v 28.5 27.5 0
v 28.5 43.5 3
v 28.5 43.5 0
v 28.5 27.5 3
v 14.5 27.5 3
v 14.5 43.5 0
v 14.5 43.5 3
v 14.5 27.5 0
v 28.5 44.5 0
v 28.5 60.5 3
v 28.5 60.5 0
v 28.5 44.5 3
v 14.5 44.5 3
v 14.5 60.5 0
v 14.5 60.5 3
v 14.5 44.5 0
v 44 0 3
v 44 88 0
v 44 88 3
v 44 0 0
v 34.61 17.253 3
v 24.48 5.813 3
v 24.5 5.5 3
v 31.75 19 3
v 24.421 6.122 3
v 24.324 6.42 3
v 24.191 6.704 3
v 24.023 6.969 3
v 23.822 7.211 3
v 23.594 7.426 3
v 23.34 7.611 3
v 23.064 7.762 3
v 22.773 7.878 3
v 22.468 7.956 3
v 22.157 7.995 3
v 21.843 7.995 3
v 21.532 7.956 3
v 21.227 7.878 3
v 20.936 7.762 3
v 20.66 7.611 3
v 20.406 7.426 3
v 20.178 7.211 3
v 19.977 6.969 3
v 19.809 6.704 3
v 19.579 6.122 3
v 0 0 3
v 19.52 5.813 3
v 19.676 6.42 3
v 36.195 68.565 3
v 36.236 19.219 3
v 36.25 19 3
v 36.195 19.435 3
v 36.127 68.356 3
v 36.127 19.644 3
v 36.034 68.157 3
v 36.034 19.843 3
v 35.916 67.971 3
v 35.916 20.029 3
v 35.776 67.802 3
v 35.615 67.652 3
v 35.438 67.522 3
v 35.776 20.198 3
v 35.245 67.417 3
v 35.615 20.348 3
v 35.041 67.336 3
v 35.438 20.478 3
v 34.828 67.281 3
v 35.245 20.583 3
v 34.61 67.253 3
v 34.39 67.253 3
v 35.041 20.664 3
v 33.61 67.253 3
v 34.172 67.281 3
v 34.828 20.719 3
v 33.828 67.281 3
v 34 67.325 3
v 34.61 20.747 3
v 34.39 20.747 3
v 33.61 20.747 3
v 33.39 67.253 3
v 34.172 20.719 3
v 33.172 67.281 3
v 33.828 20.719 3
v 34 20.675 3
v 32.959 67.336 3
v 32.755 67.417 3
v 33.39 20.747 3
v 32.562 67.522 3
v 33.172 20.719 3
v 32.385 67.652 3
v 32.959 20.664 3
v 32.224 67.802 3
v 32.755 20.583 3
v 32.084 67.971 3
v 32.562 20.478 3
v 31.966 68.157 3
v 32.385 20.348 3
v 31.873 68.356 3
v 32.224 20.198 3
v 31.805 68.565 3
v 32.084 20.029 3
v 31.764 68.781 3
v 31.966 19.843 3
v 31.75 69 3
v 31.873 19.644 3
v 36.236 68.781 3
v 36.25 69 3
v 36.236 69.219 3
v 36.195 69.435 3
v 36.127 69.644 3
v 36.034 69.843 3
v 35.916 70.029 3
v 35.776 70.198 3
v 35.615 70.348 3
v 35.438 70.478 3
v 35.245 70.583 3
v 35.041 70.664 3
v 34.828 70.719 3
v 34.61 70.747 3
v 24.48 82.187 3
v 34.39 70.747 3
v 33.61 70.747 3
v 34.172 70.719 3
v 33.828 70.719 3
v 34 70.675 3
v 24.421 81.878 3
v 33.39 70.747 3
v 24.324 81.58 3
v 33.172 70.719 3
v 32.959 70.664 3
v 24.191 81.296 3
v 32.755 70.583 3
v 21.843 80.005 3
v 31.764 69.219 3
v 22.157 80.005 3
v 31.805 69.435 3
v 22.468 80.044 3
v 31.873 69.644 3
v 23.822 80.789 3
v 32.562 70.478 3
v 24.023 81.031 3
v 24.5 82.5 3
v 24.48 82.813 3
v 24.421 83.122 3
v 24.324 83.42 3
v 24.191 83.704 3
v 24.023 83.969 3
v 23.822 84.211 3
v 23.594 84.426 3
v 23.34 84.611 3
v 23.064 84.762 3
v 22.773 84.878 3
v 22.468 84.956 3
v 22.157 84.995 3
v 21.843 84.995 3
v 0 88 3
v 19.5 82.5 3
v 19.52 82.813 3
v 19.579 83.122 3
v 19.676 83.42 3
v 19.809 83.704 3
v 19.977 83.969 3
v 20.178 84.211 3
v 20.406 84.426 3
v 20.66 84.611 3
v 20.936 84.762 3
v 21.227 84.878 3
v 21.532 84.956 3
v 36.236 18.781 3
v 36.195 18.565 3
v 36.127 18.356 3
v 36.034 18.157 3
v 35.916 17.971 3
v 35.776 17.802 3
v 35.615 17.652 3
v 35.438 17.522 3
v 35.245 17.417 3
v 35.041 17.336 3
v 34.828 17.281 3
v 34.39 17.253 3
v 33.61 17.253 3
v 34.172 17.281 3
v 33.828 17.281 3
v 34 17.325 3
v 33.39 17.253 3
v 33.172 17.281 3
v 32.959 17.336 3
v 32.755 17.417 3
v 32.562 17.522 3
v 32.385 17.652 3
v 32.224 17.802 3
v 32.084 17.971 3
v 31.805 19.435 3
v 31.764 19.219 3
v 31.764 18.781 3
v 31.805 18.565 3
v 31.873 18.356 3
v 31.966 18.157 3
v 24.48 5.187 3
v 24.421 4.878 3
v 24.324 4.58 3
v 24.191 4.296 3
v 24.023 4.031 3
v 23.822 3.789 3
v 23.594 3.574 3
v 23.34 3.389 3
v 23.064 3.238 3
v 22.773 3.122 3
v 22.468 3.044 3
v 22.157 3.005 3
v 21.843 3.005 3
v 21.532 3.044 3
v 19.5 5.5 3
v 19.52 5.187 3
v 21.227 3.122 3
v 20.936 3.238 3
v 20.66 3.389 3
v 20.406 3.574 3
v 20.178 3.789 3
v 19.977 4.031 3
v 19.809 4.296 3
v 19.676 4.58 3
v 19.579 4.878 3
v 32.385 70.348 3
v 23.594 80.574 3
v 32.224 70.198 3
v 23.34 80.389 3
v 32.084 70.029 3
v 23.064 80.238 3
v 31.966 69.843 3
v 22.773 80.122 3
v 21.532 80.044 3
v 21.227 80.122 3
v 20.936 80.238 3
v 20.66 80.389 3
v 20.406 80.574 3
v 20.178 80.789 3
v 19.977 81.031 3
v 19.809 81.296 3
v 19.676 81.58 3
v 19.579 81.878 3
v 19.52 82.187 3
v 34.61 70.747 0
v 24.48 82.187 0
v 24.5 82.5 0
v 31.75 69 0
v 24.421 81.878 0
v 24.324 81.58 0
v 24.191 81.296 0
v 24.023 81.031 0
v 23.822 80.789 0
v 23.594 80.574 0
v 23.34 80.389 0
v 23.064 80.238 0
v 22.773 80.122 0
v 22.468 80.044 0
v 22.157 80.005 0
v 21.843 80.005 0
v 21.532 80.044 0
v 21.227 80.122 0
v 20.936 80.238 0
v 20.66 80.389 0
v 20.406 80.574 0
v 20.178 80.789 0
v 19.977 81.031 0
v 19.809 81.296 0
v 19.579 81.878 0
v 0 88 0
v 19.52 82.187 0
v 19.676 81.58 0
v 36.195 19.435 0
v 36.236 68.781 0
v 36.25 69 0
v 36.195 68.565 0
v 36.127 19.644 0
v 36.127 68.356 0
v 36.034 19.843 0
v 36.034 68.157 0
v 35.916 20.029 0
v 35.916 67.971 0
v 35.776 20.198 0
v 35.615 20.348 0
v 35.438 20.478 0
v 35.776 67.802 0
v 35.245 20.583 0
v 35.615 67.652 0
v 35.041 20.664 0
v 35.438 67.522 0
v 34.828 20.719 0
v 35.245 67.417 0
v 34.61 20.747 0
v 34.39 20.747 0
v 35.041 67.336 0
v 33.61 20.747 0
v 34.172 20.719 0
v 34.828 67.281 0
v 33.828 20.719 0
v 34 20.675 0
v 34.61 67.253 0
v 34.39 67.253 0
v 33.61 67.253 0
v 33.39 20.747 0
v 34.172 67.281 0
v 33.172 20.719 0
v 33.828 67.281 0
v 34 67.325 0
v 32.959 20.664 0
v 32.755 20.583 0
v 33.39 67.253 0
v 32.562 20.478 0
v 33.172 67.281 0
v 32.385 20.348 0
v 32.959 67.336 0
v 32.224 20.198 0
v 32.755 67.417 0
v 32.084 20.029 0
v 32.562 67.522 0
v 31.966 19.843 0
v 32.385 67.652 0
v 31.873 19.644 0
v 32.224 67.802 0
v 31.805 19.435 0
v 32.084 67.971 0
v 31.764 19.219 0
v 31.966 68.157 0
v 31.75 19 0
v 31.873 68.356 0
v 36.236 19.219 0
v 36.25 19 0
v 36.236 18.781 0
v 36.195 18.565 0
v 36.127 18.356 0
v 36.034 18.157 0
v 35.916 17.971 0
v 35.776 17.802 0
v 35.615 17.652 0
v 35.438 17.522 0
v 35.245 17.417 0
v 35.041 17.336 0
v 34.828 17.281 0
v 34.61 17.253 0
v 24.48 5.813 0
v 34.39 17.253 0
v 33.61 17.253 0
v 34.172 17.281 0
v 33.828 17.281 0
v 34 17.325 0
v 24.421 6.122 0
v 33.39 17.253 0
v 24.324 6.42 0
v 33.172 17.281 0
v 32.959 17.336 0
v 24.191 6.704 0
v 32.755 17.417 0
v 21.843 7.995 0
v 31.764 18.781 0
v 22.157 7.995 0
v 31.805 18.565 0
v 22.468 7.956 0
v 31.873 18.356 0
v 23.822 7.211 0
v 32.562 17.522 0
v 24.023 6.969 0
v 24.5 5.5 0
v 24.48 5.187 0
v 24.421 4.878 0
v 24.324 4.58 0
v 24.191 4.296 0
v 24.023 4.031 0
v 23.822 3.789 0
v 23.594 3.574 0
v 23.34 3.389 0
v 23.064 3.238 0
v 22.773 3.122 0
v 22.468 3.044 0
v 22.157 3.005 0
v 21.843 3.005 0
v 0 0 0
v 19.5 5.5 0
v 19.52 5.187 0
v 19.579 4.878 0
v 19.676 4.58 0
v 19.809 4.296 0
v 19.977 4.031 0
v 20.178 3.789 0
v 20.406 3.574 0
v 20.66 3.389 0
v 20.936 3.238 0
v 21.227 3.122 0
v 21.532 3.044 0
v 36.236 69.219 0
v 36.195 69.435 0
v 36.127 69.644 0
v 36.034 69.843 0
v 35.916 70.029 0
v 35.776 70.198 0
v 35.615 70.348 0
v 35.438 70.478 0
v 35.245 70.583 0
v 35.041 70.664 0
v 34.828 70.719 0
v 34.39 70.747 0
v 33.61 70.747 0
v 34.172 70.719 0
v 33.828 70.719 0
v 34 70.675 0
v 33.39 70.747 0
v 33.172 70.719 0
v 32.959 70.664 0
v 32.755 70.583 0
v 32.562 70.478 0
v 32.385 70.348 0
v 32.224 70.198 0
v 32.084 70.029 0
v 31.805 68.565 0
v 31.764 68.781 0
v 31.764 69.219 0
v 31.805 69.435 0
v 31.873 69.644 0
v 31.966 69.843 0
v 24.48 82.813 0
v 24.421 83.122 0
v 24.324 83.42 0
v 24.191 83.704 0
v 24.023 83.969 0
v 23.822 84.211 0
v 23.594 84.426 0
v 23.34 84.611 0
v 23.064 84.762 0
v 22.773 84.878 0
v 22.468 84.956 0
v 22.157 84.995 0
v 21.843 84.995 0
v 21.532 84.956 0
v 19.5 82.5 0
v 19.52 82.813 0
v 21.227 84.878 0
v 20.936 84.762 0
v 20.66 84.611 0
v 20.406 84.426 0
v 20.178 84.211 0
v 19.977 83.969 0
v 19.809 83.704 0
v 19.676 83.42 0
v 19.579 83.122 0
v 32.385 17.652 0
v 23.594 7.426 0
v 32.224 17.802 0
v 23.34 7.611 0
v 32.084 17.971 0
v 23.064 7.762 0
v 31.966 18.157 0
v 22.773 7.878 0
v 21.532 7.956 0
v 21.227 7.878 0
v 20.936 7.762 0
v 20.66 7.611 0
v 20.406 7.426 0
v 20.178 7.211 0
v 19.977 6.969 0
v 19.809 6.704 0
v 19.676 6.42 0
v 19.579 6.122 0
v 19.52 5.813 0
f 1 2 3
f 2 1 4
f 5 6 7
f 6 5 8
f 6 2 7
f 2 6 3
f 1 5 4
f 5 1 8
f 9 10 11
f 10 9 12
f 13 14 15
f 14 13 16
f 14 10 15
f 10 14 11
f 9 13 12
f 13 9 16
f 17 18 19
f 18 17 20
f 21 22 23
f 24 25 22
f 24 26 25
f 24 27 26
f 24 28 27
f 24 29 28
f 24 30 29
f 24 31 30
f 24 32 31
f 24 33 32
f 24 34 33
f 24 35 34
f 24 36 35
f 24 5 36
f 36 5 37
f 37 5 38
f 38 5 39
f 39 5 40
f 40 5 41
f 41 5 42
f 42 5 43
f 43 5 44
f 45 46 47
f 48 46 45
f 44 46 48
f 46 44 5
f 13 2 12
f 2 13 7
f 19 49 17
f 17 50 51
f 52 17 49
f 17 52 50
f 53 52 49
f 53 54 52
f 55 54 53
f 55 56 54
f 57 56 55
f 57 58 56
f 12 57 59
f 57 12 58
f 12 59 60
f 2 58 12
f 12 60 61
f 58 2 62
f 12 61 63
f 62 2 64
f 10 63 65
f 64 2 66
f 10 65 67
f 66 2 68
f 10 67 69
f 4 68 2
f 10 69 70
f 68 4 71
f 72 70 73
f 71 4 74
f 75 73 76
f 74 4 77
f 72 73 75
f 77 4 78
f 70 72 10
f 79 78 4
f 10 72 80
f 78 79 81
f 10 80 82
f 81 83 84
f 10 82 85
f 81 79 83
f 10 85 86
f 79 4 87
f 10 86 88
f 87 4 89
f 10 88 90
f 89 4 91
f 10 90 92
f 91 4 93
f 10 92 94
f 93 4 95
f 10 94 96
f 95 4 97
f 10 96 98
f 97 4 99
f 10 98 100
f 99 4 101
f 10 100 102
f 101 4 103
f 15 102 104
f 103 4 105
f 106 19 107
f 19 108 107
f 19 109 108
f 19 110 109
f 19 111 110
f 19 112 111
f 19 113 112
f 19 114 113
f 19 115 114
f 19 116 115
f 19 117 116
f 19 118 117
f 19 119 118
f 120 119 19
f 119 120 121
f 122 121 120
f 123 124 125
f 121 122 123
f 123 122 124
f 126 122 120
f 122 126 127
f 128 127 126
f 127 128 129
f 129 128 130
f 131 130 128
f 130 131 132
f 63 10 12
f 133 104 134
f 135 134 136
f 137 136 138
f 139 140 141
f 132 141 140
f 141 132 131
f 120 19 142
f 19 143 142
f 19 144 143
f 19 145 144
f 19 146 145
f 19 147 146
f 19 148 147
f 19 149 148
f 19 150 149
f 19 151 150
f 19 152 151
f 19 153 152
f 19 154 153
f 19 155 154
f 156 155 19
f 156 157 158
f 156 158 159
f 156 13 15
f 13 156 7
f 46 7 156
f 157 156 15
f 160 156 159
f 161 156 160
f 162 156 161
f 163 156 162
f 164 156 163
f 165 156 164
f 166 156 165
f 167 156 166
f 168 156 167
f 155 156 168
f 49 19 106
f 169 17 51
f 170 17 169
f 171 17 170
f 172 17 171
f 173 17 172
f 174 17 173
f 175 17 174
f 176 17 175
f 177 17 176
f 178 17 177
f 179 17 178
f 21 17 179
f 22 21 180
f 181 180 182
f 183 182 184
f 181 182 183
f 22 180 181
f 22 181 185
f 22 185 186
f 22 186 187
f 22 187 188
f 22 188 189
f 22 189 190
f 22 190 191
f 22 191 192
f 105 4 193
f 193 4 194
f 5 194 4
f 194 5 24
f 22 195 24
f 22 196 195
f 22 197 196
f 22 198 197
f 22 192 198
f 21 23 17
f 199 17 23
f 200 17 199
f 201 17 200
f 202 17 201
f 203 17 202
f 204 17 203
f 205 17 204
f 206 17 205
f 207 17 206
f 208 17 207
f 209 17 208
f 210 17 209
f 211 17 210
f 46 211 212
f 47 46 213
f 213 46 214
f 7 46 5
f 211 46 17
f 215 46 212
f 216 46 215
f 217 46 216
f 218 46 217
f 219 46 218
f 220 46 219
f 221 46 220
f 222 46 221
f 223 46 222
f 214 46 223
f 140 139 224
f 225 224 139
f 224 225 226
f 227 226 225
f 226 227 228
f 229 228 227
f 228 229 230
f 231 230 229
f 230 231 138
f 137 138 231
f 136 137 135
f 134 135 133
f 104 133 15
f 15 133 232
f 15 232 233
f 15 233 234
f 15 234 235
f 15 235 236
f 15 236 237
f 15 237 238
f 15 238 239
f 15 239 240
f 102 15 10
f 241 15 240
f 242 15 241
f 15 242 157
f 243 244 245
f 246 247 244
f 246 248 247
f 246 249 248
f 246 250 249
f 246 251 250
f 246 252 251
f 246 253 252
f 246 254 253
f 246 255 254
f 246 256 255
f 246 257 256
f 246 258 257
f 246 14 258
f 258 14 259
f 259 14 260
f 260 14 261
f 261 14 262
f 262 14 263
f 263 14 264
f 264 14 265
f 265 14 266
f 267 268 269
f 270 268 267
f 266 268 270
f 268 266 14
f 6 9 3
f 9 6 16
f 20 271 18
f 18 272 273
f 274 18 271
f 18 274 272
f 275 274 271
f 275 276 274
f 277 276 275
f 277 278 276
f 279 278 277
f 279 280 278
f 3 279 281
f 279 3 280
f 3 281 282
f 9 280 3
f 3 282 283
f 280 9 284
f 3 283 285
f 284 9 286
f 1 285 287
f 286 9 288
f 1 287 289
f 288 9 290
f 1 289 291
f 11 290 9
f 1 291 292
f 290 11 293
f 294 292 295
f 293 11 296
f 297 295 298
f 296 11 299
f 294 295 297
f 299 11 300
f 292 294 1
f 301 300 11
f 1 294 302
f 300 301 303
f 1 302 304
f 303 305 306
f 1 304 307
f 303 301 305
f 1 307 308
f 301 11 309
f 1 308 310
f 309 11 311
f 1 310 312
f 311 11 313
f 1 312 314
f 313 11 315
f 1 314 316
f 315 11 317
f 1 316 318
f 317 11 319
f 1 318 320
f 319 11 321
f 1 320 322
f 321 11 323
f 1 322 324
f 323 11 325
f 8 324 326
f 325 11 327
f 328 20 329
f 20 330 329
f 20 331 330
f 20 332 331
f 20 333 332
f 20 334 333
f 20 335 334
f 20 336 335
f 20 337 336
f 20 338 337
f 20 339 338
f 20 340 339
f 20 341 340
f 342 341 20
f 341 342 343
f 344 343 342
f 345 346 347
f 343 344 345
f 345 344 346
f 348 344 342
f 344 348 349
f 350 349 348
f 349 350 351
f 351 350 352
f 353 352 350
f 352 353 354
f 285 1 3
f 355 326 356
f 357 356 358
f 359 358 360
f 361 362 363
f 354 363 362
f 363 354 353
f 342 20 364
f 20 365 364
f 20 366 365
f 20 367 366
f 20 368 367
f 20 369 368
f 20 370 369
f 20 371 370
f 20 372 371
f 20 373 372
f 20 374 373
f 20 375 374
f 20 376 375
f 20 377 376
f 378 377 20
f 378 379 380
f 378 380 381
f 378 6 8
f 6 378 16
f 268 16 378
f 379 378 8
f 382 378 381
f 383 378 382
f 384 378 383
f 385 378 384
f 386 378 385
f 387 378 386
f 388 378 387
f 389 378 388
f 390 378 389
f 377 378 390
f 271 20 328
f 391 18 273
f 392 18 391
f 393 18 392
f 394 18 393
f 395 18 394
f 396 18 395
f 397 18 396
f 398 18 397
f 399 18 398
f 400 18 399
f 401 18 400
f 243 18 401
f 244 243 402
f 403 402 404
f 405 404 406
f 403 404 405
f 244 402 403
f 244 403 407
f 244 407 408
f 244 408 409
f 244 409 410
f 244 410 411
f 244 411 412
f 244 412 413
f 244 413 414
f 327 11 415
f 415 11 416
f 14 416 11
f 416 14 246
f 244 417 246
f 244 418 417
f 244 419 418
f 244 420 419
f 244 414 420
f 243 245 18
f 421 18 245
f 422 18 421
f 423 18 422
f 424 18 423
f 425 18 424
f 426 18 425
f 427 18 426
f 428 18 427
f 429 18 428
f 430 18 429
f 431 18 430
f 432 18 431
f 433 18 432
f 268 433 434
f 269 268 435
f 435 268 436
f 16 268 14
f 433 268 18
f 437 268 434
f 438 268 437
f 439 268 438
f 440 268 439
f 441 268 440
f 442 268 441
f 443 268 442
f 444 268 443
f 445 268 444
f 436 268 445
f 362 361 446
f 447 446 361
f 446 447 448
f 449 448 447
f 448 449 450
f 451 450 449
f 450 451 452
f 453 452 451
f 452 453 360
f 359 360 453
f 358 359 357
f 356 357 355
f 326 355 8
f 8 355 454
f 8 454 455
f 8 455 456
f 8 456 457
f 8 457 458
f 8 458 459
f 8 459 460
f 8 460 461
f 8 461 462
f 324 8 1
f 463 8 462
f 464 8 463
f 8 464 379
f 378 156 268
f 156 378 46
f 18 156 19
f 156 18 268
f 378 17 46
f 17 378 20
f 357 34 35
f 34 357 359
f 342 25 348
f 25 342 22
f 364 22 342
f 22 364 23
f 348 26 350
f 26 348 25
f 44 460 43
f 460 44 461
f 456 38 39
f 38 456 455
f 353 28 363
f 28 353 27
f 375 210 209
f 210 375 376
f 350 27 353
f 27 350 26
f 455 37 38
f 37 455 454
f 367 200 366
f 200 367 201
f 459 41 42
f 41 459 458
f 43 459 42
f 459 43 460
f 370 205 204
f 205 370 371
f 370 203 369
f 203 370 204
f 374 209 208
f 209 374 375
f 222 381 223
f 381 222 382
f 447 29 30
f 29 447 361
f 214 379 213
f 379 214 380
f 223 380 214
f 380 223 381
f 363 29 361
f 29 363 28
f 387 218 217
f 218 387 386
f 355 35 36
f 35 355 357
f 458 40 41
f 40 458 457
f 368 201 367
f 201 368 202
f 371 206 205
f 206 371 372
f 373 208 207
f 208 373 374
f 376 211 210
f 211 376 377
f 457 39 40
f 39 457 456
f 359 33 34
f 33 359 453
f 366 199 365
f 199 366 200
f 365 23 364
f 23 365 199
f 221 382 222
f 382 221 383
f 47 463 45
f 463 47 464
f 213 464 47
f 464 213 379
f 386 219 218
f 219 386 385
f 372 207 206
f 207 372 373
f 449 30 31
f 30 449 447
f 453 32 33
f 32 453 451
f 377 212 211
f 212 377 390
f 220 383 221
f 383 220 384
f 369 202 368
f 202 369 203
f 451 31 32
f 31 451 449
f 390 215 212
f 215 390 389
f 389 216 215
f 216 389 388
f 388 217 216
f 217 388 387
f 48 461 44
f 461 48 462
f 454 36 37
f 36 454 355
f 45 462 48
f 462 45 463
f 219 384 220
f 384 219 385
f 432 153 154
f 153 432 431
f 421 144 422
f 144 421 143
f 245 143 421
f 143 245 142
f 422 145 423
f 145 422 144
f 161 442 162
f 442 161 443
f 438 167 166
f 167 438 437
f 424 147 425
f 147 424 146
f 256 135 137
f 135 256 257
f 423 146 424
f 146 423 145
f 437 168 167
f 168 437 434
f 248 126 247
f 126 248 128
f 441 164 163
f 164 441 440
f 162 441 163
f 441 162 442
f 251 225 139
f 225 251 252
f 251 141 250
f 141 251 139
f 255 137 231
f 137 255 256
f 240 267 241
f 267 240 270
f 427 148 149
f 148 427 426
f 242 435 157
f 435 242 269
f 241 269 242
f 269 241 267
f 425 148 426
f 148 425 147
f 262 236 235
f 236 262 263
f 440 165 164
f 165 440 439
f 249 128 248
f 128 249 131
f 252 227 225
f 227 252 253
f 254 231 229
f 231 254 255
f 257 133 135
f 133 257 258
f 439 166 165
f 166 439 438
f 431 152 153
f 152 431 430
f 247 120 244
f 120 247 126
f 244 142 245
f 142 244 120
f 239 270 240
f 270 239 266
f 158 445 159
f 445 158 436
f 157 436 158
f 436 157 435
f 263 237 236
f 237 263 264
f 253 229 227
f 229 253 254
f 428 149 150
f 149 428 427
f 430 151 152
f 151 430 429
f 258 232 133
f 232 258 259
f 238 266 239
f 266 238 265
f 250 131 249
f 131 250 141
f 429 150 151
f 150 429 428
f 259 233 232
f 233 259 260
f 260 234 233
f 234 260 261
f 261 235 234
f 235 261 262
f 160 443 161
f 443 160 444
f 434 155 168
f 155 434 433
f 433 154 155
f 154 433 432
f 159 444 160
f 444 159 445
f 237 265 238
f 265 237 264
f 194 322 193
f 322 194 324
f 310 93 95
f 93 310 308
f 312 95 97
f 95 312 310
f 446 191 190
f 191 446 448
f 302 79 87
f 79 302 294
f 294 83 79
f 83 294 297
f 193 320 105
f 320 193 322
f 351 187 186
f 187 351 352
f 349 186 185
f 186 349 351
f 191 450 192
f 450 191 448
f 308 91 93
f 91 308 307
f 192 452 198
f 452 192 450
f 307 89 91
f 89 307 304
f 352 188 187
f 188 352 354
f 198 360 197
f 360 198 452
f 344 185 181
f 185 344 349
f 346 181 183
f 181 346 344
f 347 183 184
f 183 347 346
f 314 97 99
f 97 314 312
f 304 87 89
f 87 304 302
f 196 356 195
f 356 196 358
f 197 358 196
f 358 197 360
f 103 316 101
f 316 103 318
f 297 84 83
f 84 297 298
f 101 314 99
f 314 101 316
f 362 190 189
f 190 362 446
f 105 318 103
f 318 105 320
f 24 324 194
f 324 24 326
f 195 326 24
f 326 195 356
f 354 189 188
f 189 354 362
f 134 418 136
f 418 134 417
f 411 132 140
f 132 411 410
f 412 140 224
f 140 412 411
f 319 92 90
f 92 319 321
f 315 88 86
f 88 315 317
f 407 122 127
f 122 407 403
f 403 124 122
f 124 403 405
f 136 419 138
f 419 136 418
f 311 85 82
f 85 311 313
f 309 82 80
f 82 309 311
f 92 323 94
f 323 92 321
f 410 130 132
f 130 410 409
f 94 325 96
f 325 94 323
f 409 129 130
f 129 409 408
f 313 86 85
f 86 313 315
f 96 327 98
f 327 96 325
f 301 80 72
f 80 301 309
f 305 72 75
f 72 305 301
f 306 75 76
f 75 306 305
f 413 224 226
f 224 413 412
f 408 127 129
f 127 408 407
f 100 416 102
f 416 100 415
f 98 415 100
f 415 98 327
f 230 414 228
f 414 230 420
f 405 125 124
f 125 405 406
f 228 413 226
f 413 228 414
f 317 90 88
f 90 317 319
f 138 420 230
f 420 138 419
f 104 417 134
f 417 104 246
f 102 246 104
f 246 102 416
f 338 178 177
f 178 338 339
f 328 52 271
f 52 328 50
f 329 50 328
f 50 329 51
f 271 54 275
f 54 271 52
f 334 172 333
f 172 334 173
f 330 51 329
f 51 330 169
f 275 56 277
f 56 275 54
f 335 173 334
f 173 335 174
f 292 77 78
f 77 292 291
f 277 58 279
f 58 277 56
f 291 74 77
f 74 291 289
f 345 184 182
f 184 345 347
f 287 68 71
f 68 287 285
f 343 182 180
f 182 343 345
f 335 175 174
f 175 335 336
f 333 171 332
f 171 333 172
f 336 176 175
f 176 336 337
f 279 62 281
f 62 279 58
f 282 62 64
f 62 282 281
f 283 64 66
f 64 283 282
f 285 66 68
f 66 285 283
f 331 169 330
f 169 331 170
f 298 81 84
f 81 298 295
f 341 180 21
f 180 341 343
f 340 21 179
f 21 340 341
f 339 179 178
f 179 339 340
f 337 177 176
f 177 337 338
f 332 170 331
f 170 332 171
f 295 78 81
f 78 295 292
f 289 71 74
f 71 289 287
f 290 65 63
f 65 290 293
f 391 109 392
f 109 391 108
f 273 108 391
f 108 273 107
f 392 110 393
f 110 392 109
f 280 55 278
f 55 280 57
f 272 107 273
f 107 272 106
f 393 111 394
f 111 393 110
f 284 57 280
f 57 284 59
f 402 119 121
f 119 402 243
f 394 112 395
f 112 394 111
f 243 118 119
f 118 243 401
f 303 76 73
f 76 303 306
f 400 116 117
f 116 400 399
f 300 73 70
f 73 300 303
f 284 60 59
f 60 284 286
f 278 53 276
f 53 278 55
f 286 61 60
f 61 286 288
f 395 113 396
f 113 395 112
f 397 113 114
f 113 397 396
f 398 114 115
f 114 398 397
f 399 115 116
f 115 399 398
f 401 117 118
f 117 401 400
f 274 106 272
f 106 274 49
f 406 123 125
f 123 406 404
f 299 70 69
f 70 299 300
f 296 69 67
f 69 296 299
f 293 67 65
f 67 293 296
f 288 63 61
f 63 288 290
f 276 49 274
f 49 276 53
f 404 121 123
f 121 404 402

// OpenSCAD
$fn=50;

ep = 3;

bw = 45;

ethh = 14;
ethw = 16;

difference(){
	cube([44,88,ep]);
	translate([22,5.5,-0.5])
		#cylinder(ep+1,d=5);
	translate([22,88-5.5,-0.5])
		cylinder(ep+1,d=5);
	translate([22-15/2,44-33/2,-0.5])
		union(){
		cube([ethh,ethw,ep+1]);
		translate([0,ethw+1,0])
			cube([ethh,ethw,ep+1]);
		}
	translate([22+ethh-15/2+5,(88-bw)/2-2.5,-0.5])
		cylinder(ep+1,d=3.5);
	translate([22+ethh-15/2+5,(88-bw)/2-2.5+50,-0.5])
		cylinder(ep+1,d=3.5);
	translate([22+ethh-15/2+6,(88-bw)/2-2.5,-0.5])
		cylinder(ep+1,d=3.5);
	translate([22+ethh-15/2+6,(88-bw)/2-2.5+50,-0.5])
		cylinder(ep+1,d=3.5);
};
